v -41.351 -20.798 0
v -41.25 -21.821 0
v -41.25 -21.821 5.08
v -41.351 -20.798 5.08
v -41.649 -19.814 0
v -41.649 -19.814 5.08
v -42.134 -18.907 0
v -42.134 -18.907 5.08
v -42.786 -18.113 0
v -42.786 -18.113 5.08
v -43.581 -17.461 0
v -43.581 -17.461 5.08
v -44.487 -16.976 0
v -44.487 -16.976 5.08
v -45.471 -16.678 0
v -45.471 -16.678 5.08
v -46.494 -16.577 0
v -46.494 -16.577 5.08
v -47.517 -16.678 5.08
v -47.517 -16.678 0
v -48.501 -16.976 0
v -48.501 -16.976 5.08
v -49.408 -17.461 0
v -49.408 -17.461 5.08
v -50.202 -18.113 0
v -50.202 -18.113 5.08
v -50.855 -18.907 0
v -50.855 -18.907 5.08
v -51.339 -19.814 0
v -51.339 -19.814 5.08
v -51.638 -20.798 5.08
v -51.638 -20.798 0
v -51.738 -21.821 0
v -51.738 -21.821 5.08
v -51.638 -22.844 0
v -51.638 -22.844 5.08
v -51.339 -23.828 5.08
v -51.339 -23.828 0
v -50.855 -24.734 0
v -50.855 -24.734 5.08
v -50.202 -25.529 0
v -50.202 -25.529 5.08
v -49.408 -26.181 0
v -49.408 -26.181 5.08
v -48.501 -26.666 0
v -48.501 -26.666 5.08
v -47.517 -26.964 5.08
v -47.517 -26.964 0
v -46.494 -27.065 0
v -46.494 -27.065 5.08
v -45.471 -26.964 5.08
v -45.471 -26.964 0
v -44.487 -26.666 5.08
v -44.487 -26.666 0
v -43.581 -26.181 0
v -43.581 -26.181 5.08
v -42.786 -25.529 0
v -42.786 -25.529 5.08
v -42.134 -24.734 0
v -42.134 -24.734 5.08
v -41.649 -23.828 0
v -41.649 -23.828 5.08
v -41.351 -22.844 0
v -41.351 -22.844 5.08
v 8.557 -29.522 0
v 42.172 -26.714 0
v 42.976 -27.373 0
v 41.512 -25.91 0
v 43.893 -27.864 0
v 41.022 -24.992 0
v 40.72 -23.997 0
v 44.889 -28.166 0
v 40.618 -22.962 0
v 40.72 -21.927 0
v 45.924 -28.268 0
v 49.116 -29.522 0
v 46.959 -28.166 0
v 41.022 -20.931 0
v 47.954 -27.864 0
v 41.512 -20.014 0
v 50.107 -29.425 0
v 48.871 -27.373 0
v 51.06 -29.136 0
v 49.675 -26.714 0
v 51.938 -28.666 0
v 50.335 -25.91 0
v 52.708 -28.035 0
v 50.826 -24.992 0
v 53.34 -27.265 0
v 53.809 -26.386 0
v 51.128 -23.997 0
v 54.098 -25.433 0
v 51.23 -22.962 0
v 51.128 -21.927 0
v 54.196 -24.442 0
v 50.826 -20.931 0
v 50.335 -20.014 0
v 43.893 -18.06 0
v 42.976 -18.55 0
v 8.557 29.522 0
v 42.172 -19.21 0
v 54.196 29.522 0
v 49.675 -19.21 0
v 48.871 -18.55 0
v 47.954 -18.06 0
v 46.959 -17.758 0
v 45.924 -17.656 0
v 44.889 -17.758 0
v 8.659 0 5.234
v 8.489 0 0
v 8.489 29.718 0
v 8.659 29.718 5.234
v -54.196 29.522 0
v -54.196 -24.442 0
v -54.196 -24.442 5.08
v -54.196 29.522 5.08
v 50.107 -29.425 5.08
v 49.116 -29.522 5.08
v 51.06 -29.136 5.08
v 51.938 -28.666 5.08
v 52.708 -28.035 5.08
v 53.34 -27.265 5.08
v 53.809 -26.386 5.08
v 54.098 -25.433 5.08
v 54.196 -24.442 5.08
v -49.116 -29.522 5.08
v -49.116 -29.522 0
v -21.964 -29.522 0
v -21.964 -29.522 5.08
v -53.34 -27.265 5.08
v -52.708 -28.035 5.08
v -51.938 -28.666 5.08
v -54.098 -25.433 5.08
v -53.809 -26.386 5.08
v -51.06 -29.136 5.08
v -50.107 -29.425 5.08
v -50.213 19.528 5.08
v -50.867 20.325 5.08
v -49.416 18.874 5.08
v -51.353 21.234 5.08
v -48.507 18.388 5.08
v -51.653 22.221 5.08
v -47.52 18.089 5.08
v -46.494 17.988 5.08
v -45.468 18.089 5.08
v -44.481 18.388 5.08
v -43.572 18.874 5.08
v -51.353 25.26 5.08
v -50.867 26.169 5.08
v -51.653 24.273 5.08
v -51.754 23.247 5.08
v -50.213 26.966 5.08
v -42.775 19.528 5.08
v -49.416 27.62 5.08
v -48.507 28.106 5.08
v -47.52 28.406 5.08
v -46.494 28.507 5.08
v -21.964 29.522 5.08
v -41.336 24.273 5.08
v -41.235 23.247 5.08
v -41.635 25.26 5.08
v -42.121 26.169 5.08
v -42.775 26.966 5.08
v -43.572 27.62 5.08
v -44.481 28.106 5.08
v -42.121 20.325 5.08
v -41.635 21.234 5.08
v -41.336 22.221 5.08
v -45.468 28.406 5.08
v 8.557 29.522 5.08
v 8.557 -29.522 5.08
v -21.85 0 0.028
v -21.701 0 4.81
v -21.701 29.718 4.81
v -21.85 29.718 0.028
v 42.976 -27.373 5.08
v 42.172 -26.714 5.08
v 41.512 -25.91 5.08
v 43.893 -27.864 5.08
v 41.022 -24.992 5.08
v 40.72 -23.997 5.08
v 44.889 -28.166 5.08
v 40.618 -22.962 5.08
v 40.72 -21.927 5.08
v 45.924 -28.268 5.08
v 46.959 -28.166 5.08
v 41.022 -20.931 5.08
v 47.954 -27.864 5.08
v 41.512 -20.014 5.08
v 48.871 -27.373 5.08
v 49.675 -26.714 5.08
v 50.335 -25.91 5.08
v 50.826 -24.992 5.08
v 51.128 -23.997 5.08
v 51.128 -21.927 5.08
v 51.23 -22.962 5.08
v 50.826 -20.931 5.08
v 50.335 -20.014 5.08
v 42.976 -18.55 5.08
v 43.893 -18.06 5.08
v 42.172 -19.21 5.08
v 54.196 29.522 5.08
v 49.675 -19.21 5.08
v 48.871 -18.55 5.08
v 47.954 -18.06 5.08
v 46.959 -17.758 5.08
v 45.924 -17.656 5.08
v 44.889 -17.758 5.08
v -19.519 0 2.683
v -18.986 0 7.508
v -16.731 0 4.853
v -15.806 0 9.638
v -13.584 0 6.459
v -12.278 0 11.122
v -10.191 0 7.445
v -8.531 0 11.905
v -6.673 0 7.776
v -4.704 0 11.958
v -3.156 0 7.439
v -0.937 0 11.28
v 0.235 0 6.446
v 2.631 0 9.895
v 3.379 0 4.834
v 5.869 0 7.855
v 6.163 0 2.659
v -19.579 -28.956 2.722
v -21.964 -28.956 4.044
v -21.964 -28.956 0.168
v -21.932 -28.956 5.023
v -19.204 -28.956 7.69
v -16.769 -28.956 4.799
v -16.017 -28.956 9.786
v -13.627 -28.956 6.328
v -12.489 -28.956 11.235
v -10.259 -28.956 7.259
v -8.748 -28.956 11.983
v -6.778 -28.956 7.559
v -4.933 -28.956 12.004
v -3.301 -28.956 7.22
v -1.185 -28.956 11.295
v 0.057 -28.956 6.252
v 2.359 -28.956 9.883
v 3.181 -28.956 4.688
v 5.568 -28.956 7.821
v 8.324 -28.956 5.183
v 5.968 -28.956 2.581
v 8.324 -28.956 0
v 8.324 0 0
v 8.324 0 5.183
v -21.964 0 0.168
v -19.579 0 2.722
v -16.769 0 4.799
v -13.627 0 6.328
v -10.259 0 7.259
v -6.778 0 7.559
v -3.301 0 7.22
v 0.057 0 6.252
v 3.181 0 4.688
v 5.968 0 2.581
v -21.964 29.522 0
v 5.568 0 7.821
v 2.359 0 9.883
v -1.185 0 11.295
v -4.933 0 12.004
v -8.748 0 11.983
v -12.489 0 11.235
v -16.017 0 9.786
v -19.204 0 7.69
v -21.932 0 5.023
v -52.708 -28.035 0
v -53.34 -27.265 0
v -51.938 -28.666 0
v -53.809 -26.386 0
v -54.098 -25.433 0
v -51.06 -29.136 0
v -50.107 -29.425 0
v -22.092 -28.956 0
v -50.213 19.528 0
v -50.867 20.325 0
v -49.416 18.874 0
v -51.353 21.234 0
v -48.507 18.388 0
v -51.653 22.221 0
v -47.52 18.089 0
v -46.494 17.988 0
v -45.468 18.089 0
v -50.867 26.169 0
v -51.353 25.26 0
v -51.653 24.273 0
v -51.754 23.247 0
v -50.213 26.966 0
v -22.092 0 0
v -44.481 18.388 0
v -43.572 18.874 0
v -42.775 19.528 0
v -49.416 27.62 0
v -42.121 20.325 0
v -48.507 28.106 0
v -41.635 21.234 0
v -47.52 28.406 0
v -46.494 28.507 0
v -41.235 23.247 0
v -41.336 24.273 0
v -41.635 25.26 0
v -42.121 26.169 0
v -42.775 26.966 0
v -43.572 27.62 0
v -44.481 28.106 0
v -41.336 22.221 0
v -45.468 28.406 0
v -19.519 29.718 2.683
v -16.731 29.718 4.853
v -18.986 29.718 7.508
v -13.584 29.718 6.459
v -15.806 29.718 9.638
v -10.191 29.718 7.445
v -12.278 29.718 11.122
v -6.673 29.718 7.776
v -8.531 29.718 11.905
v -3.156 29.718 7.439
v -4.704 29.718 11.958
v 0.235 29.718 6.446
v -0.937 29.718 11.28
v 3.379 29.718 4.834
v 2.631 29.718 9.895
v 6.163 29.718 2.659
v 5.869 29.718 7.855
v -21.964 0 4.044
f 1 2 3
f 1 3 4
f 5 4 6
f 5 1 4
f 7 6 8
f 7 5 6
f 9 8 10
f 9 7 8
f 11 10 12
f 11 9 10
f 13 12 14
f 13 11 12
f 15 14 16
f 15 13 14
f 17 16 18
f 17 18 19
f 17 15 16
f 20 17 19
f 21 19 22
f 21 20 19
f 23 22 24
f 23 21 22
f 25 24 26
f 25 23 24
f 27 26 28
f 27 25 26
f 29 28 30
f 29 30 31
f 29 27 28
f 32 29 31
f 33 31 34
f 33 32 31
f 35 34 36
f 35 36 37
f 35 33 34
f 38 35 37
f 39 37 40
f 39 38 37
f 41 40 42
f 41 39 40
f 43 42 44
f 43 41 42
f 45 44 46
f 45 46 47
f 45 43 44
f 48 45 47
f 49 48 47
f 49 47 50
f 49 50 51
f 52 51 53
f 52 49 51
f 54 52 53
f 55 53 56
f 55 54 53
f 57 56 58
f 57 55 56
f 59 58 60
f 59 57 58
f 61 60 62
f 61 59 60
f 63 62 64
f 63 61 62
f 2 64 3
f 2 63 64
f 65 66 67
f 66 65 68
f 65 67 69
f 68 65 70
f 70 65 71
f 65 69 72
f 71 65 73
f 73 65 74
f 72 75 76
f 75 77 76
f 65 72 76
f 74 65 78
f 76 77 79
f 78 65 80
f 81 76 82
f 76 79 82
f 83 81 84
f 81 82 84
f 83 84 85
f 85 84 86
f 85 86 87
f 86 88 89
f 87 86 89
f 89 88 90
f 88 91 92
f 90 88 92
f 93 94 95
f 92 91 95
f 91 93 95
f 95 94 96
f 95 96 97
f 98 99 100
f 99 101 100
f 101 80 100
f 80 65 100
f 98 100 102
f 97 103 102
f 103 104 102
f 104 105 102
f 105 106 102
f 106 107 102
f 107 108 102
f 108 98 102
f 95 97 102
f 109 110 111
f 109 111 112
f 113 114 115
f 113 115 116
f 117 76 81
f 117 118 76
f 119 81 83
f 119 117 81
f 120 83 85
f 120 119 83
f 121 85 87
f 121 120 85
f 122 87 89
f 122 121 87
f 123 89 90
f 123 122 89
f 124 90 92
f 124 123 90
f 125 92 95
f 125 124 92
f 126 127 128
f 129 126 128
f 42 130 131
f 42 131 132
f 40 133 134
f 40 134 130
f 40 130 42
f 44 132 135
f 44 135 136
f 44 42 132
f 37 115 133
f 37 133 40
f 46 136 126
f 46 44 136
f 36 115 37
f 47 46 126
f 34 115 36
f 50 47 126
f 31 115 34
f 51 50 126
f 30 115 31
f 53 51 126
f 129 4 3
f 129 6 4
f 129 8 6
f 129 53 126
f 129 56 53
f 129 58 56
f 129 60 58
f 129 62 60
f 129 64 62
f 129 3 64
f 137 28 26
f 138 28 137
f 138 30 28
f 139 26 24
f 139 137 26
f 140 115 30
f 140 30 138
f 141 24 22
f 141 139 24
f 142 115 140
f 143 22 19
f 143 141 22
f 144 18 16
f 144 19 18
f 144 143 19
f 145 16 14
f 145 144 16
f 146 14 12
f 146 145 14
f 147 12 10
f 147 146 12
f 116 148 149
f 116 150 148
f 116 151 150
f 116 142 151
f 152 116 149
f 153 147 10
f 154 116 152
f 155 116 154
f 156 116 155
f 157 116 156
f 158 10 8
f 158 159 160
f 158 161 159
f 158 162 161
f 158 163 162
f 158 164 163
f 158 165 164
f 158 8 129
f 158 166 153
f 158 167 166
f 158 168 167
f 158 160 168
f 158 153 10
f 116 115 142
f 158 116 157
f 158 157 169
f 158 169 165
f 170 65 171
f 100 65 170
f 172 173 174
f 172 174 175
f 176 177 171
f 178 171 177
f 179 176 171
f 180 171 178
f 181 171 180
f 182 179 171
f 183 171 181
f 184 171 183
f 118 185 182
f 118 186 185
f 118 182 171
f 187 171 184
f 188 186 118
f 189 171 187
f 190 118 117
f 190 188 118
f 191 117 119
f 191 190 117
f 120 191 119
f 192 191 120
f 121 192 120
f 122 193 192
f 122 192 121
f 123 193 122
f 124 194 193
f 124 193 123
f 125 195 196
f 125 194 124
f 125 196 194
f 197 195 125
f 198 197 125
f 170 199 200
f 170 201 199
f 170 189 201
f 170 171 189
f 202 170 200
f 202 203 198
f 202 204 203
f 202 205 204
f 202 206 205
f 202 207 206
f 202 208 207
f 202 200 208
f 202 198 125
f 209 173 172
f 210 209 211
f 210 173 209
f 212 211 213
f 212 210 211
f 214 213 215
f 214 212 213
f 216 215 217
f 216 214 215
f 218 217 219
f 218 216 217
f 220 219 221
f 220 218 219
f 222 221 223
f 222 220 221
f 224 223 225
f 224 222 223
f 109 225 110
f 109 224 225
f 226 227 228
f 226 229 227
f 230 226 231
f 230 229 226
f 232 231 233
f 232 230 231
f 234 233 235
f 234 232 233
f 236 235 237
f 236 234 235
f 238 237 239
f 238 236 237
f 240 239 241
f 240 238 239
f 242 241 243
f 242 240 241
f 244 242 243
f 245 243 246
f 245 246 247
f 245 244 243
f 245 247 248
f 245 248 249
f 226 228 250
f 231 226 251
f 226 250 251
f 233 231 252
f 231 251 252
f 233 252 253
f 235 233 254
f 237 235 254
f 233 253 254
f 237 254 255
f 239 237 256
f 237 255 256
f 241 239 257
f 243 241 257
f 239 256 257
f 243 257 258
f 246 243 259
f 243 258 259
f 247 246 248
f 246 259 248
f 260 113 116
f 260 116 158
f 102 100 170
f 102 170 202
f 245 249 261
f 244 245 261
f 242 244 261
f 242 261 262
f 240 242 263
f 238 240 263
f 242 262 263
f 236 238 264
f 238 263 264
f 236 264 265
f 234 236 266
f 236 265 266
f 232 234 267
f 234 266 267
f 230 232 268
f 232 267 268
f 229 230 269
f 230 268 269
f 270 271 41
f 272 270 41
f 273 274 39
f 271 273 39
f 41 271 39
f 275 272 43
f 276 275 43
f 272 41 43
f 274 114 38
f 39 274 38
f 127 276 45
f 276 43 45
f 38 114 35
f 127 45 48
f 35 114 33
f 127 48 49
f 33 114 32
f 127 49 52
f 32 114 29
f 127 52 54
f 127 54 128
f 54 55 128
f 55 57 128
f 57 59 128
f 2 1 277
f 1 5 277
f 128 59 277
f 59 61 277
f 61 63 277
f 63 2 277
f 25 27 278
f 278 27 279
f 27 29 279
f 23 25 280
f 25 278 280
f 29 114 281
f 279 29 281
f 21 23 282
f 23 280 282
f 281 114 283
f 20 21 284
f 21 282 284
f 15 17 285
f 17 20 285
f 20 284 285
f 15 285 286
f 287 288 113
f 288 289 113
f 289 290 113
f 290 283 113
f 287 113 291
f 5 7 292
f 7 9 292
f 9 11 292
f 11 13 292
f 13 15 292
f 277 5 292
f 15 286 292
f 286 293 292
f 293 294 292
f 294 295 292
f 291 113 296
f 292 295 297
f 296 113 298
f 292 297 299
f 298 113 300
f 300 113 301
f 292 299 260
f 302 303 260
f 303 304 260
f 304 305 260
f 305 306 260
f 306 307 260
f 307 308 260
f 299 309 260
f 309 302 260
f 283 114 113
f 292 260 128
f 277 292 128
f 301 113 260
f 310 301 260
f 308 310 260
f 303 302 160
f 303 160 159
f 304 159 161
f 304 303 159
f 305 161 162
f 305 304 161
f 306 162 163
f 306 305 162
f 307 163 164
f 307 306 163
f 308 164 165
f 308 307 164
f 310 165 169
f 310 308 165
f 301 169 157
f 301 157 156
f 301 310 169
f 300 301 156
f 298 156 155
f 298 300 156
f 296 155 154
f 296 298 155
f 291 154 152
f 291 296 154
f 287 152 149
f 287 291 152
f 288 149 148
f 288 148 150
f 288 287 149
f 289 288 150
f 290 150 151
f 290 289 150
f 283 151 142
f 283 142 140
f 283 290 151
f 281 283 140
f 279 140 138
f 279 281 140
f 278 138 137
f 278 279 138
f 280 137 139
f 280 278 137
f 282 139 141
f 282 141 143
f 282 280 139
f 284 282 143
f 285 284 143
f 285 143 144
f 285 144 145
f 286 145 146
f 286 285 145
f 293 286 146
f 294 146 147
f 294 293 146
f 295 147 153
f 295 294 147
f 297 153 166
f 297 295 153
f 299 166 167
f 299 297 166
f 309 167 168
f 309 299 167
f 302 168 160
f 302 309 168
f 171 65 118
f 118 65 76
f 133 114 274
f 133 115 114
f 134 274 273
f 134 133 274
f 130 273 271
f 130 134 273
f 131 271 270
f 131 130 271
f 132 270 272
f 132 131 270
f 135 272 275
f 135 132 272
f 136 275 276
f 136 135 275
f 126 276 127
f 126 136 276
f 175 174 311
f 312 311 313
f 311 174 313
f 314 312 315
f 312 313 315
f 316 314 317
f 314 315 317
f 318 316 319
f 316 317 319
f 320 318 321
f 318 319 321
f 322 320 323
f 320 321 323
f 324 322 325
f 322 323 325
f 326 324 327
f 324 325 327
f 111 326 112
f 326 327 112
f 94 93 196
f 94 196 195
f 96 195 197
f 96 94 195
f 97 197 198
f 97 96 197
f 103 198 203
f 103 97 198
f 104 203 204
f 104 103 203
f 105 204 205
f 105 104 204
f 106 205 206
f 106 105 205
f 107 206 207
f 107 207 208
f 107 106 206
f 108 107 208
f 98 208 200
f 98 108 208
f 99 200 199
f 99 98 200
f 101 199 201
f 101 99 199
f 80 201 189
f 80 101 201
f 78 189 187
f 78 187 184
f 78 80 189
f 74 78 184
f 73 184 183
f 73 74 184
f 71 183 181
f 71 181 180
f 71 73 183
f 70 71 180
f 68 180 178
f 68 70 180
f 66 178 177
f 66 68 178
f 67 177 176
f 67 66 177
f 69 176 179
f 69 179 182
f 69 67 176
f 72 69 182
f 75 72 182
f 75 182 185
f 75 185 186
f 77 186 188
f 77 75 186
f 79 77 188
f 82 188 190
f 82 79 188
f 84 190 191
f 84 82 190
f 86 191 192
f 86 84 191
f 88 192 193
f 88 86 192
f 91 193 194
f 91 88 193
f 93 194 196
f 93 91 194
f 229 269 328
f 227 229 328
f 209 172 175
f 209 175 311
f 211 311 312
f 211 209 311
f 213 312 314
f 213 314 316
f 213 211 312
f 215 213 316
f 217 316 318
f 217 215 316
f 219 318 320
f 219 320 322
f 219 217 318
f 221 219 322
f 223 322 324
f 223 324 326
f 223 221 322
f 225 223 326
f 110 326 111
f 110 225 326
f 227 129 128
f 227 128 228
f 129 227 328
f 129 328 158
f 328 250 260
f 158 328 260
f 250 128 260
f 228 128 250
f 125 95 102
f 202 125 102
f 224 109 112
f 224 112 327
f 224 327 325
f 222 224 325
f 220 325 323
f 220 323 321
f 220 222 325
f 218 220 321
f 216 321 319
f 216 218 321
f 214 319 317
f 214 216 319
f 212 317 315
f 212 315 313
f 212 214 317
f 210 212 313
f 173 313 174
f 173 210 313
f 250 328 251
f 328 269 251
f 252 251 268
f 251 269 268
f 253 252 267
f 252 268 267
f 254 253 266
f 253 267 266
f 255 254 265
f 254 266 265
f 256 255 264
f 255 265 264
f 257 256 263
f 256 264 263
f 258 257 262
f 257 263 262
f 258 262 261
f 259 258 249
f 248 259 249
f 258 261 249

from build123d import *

# Parameters (mm, degrees)
F0_W     = 32.232192
F0_H     = 59.044812
F0_R     = 5.244087
F0_R_2   = 5.259579
F0_W_2   = 45.638502
F0_R_3   = 5.305781
F1_DEPTH = 5.08
F2_R     = 5.08
F4_DEPTH = 28.956
F6_DEPTH = 29.718


with BuildPart() as f1:
    # F0 (on Top) → F1 (new body)
    with BuildSketch(Plane.XY):
        with Locations((-38.079625, 0)):
            Rectangle(F0_W, F0_H)
        with Locations((-46.494223, -21.82091)):
            Circle(F0_R, mode=Mode.SUBTRACT)
        with Locations((-46.494223, 23.247113)):
            Circle(F0_R_2, mode=Mode.SUBTRACT)
        with Locations((31.37647, 0)):
            Rectangle(F0_W_2, F0_H)
        with Locations((45.923743, -22.961872)):
            Circle(F0_R_3, mode=Mode.SUBTRACT)
    extrude(amount=F1_DEPTH)

    # F2
    f2_edges = [f1.edges().sort_by_distance(p)[0] for p in [
        (-54.195721, -29.522406, 2.54),
        (54.195721, -29.522406, 2.54),
    ]]
    fillet(f2_edges, radius=F2_R)

    # F3 (on Front) → F4 (join)
    with BuildSketch(Plane.XZ):
        with BuildLine():
            ThreePointArc((-22.092413, 0), (-6.884253, 7.559739), (8.323907, 0))
            Line((8.323907, 0), (8.323907, 5.183358))
            ThreePointArc((8.323907, 5.183358), (-6.841151, 12.085168), (-21.932326, 5.023273))
            Line((-21.932326, 5.023273), (-22.092413, 0))
        make_face()
    extrude(amount=F4_DEPTH)


with BuildPart() as f6:
    # F5 (on Front) → F6 (new body)
    with BuildSketch(Plane.XZ):
        with BuildLine():
            Line((8.489107, 0), (8.658712, 5.234044))
            ThreePointArc((8.658712, 5.234044), (-6.61873, 12.023499), (-21.7006, 4.810032))
            Line((-21.7006, 4.810032), (-21.85004, 0.027953))
            ThreePointArc((-21.85004, 0.027953), (-6.673316, 7.775538), (8.489107, 0))
        make_face()
    extrude(amount=-F6_DEPTH)


solid = Compound([f1.part, f6.part])
